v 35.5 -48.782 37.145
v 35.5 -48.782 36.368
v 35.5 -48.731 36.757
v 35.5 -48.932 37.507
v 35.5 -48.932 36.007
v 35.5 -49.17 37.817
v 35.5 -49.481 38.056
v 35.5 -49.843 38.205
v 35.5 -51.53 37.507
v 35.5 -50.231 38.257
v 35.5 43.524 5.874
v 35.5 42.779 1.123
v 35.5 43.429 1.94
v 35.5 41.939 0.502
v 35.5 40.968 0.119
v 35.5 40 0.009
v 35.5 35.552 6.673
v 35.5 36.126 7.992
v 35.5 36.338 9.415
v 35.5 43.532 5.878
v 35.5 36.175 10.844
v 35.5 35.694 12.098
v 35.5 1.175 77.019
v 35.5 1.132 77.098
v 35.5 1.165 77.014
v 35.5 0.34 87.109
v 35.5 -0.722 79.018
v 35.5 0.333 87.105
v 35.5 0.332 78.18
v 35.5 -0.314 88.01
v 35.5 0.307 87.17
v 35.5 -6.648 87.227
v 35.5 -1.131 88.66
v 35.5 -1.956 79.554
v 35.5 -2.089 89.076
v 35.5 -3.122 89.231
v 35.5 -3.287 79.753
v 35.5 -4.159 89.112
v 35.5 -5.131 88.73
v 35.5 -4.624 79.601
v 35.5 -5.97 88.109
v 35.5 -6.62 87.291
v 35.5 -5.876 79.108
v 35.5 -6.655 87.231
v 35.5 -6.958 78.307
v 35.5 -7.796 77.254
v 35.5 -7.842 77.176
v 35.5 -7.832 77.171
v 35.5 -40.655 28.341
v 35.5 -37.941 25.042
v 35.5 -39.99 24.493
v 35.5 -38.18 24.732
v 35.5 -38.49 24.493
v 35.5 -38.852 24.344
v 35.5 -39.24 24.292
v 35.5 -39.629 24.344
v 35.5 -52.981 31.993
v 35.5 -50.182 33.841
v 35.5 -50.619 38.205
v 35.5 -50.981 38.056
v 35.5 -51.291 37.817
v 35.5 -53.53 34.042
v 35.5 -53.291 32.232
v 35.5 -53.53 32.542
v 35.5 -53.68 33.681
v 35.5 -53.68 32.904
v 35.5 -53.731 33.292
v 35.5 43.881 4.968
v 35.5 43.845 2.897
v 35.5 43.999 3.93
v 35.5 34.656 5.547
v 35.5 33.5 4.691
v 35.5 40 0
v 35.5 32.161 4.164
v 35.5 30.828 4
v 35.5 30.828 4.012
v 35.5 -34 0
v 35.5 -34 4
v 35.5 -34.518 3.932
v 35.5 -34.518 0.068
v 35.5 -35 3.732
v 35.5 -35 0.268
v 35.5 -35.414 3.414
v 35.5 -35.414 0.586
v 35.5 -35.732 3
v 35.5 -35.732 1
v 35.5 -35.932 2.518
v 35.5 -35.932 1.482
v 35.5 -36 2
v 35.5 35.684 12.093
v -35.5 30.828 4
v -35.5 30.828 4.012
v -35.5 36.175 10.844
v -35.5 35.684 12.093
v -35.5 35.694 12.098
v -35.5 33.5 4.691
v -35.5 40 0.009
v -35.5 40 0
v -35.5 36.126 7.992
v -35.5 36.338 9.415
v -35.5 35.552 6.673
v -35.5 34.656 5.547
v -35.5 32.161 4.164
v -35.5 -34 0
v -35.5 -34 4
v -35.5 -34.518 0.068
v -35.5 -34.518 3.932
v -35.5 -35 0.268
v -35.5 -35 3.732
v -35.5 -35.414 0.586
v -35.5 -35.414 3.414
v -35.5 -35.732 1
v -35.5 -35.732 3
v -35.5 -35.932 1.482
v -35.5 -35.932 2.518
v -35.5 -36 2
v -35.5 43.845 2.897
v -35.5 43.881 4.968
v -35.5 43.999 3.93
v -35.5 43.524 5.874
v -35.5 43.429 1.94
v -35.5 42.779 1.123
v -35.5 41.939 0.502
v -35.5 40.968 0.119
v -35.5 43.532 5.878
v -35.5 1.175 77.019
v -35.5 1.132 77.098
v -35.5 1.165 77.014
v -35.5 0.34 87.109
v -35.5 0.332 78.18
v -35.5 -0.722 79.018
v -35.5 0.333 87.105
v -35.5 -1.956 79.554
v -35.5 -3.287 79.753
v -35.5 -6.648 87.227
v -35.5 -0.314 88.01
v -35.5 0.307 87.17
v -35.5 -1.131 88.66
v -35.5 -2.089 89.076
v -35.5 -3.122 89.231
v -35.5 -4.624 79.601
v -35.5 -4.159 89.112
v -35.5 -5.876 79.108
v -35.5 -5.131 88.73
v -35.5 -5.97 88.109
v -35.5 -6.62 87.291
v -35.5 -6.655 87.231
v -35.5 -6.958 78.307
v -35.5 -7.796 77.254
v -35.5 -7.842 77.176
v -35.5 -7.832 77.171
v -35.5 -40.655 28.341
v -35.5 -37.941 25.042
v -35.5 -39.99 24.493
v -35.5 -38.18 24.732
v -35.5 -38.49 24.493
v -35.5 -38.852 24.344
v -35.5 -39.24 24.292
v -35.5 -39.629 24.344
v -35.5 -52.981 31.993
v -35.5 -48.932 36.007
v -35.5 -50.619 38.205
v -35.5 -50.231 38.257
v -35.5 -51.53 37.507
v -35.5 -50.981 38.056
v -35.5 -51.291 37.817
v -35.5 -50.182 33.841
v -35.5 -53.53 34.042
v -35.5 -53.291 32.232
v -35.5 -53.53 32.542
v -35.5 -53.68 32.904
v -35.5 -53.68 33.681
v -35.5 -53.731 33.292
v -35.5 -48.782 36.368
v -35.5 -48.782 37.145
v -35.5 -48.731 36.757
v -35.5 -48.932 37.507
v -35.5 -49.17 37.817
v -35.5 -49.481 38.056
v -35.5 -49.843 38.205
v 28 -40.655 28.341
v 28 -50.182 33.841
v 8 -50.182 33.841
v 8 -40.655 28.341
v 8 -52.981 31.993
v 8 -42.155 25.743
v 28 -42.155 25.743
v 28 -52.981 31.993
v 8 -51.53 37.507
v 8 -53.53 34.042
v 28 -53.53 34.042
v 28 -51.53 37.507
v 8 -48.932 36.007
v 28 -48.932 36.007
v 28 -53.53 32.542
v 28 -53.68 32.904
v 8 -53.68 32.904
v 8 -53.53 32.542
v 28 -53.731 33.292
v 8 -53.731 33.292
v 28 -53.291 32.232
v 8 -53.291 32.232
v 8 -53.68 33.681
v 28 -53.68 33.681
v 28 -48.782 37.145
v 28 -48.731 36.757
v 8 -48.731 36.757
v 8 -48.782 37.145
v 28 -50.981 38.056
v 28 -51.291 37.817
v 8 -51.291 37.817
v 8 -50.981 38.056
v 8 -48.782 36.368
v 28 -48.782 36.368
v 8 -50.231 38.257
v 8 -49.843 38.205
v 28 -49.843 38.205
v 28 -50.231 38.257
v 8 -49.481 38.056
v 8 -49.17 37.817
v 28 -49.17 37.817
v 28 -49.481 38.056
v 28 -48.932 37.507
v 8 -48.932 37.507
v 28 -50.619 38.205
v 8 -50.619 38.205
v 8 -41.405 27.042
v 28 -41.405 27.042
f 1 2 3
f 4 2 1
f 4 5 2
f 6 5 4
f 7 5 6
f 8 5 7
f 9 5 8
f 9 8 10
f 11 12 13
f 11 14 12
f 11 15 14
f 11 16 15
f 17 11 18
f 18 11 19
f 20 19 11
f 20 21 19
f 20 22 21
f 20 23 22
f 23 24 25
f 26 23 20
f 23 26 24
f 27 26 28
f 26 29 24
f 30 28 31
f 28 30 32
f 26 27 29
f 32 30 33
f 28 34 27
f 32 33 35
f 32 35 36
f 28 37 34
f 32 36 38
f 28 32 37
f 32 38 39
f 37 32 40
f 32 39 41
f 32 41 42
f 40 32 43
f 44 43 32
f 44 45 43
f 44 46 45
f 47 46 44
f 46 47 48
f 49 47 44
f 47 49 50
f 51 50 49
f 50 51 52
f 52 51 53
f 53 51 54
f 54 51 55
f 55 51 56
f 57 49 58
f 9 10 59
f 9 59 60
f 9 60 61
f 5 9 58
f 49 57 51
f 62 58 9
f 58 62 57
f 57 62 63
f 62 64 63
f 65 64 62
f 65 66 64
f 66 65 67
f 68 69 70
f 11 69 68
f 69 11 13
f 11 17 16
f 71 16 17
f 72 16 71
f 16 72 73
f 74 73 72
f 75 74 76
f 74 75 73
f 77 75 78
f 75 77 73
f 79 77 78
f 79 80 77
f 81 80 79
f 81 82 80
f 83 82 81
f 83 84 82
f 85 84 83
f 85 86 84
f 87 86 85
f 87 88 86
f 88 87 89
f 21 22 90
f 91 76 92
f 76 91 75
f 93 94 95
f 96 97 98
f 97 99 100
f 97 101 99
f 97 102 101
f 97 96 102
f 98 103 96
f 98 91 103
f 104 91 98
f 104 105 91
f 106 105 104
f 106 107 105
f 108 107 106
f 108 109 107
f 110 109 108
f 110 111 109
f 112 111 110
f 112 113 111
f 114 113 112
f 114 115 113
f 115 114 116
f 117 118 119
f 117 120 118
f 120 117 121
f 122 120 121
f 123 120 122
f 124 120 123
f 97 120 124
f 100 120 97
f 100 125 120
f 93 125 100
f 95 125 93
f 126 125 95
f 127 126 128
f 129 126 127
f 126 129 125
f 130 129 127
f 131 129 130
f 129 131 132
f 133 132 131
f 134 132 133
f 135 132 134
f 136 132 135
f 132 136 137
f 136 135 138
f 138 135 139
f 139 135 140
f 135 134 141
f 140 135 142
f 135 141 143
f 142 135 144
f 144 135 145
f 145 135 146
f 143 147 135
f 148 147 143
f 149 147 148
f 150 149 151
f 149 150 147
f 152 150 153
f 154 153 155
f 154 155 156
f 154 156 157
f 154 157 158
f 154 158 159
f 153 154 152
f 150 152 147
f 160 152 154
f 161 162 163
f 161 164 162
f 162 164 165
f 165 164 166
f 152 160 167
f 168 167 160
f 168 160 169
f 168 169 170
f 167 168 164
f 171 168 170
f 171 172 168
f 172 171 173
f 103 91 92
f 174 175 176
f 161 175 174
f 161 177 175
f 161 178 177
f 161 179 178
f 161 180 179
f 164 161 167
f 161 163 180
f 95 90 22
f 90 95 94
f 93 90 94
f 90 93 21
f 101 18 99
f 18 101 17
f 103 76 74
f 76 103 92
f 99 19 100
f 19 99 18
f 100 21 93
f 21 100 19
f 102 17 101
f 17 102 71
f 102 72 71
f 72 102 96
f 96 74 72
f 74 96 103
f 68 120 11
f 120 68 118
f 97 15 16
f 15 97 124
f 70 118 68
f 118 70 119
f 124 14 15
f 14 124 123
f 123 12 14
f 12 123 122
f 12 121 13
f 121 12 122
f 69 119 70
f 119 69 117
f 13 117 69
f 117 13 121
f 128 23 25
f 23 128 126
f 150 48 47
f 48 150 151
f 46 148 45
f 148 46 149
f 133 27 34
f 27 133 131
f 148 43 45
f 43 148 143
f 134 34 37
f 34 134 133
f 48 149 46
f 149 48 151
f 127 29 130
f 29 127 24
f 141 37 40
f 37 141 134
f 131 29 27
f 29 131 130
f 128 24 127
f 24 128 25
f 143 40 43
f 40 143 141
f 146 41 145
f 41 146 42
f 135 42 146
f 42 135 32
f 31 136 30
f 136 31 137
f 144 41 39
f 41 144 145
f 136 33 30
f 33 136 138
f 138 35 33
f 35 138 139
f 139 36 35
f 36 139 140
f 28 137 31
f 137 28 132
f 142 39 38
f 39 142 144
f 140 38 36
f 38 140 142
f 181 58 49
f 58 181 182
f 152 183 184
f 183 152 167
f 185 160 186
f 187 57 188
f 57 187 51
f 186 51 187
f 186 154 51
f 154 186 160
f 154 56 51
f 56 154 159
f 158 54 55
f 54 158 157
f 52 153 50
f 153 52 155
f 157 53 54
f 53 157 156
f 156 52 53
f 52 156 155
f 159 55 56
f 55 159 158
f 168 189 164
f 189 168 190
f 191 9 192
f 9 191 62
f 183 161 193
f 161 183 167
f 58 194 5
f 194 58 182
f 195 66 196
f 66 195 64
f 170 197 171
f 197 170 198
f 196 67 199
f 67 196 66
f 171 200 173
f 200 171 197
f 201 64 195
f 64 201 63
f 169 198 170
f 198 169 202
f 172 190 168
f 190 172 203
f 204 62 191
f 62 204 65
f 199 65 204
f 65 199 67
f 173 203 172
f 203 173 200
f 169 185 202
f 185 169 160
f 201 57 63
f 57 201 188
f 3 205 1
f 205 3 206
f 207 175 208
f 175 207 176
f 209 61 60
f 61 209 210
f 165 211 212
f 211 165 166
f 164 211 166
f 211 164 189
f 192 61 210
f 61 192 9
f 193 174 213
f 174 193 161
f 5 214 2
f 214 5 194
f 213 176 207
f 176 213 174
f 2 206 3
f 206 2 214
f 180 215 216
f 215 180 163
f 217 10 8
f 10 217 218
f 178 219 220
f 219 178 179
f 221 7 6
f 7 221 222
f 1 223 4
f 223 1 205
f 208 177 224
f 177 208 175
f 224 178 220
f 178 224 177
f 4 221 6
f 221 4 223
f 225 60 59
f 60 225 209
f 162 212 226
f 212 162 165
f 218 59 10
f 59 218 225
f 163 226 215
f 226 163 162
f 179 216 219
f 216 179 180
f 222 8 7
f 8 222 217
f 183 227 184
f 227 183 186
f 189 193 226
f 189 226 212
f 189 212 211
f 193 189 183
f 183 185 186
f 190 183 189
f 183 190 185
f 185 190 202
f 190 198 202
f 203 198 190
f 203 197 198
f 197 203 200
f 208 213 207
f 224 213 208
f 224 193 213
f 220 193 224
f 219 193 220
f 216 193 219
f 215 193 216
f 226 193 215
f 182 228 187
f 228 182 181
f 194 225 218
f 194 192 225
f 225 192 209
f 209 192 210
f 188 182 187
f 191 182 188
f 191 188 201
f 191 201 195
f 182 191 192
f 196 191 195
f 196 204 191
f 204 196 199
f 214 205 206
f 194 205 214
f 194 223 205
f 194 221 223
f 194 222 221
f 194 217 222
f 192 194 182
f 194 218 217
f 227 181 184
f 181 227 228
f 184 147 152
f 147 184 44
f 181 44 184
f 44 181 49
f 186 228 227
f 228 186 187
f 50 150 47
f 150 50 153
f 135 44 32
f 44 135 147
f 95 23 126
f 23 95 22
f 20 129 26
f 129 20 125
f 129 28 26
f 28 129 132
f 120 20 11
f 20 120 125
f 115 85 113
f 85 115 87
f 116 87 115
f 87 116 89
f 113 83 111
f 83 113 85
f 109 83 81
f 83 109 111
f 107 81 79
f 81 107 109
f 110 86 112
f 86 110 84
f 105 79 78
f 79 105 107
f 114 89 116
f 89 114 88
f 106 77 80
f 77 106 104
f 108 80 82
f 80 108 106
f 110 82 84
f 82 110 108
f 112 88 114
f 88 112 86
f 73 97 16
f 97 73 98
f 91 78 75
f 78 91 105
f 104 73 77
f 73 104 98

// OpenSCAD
// OpenSCAD file to create custom sized/configured phone or tablet stand.
//
// preview[view:south east, tilt:top diagonal]
//
// Created May 29th, 2018 by Allan M. Estes
// First upload to Thingiverse Feb. 16th, 2019
//
// to do:
//   allow interior corner fillets to be scalled
//
// Last modified Feb. 16th, 2019

orientation = 1; // [1:for viewing,0:for printing]
// - how thick the base, back and face will be.
thick = 4;
// - overall width of stand.
stand_width  = 71;
// (base dimensions are width x base_length x thick)
base_length  = 80;  // outside measure
// (back dimensions are width x back_length x thick)
back_length = 100;  // back outside measure
// - zero degrees is folded flat against base, ninety is vertical.
back_angle  = 62;  // [1:179]
// (face/front dimensions are width x face_length x thick)
face_length  = 75;  // face outside measure
// - zero degrees is horizontal, negative ninety is hanging vertically.
face_angle  = -60;  // [-90:0]

// - device rests on ledge, it should equal or excced device thickness
ledge = 11;  // inside measure
// - creates opening in ledge (for charge cable, etc.), 0 to disable
ledge_gap_length = 20;
// - gap position: >0 moves gap left of stand center, <0 moves right
ledge_gap_offset = -18;
;

// - size of notch at end/edge of ledge (headphone plug, speaker, etc.), 0 for none, >0 on left end, <0 on right end
ledge_edge_slot_length = 0;
ledge_edge_slot_width = 0;
ledge_edge_slot_pos = 0;    // [1:back of ledge,0:center of ledge,-1:front_of ledge]

// - opening in back and face (depending on angles and sizes) of stand
arch_width  = 0;        // must be narrower than width
arch_height = 33;       // must be larger than or equal to arch_width

// - internal fill at bends.
fillet = 2; // [1:minumum, 2:light, 3:medium, 4:heavy, 5:maximum]

module dummy(x) {
}

$fn=24;

lip = 2.5;  //outside measure

ledge_thick = thick * .75;
ledge_edge_slot_pct = min(ledge,ledge_edge_slot_width)/ledge;

width = stand_width;
base  = base_length-thick*1.5;
back = back_length-thick*2;
face  = face_length-thick-ledge_thick/2;

base_back_angle = back_angle;
back_face_angle =  180+face_angle-back_angle;

orient_x   = orientation ? width/2 : -base/2;
orient_y   = orientation ? base_length/2 : -sin(back_angle)*back_length/2;
orient_rot = orientation ? 90 : 0;

//  Start of Code...

module fold(angle,radius,hgt) {
foo = min(angle,90)/90 * fillet;
thy = radius*foo/sin(angle/2);
hy = radius*foo*1.1/sin(angle/2);
hi = radius*foo*1.1*cos(angle/2);
ry = radius*1.1/sin(angle/2);
ri = radius*1.1*cos(angle/2);
x = hi/tan(angle/2);
    // fillet
    difference(){
        translate([(thy-hy),0,0]) linear_extrude(height=hgt) polygon([[0,0],[x,hi],[hy,0],[x,-hi]]);
    
        translate([thy,0,-.1])
        cylinder(r=radius*foo,h=hgt+.2);
    }
    // rounding
    difference(){
        cylinder(r=radius,h=hgt);
        translate([0,0,-.1]) linear_extrude(height=hgt+.2) polygon([[0,0],[ri,ry],[ry,ry],[ry,-ry],[ri,-ry]]);
    }
}


module ledge_slots() {
    if (ledge_gap_length>0) translate([thick,-.1,width/2+ledge_gap_offset-ledge_gap_length/2])
    cube([ledge+thick,lip*4+.1,ledge_gap_length]);

    if (ledge_edge_slot_length>0) translate([ledge/2+thick+((1-ledge_edge_slot_pct)*ledge/2*ledge_edge_slot_pos),-.1,width-ledge_edge_slot_length/2]) {
        rotate([-90,90,0])
        cylinder(d=ledge*ledge_edge_slot_pct,h=ledge_thick+.2);
        translate([-ledge/2*ledge_edge_slot_pct,0,0])
        cube([ledge*ledge_edge_slot_pct,ledge_thick+.2,ledge_edge_slot_length]);
    }

    if (ledge_edge_slot_length<0) translate([ledge/2+thick+((ledge_edge_slot_pct)*ledge/2*ledge_edge_slot_pos),-.1,-ledge_edge_slot_length-ledge/2]) {
        rotate([-90,90,0])
        cylinder(d=ledge*ledge_edge_slot_pct,h=ledge_thick+.2);
        translate([-ledge/2*ledge_edge_slot_pct,0,ledge_edge_slot_length])
        cube([ledge*ledge_edge_slot_pct,ledge_thick+.2,-ledge_edge_slot_length]);
    }
}


translate([orient_x,orient_y,0]) rotate([orient_rot,0,-orient_rot])  // position for display or printing
difference() {
    union() {
        //base/back rounding&fillet
        translate([0,thick,0]) rotate(base_back_angle/2,0,0) fold(base_back_angle,thick,width);
        //base front rounding
        translate([base,thick/2,0])
        cylinder(d=thick,h=width);
        //base
        cube([base,thick,width]);
        
        translate([0,thick,0]) rotate([0,0,base_back_angle-90]) {
            //back
            translate([-thick,0,0]) cube([thick,back,width]);
        
            translate([0,back,0]) rotate([0,0,back_face_angle]) translate([0,-face,0]) {
                //face/back rounding&fillet
                translate([0,face,0]) rotate([0,0,-90-back_face_angle/2]) fold(back_face_angle,thick,width);
                //face
                cube([thick,face,width]);

                translate([0,-ledge_thick/2,0]) difference() { // ledge w/holes) & lip
                    union() {
                        translate([ledge_thick/2,0,0]) {
                            //ledge
                            cube([ledge+thick,ledge_thick,width]);
                            //face+ledge rounding
                            translate([0,ledge_thick/2,0])
                            cylinder(d=ledge_thick,h=width);
                        }
                        translate([ledge+thick+ledge_thick/2,ledge_thick/2,0]){
                            //lip
                            translate([-ledge_thick/2,0,0])
                            cube([ledge_thick,lip+(ledge_thick/2),width]);
                            //ledge+lip rounding
                            cylinder(d=ledge_thick,h=width);
                            //lip rounding
                            translate([0,lip+(ledge_thick/2),0])
                            cylinder(d=ledge_thick,h=width);
                        }
                    }
                    ledge_slots();
                }
            }
        }
    }
    //through hole
    translate([-base,thick+.01,(width-arch_width)/2])
    union(){
        cube([base*2.5,arch_height-arch_width/2,arch_width]);
        translate([0,arch_height-arch_width/2,arch_width/2])
        rotate([0,90,0])
        cylinder(d=arch_width,h=base*2.5);
    }
}
